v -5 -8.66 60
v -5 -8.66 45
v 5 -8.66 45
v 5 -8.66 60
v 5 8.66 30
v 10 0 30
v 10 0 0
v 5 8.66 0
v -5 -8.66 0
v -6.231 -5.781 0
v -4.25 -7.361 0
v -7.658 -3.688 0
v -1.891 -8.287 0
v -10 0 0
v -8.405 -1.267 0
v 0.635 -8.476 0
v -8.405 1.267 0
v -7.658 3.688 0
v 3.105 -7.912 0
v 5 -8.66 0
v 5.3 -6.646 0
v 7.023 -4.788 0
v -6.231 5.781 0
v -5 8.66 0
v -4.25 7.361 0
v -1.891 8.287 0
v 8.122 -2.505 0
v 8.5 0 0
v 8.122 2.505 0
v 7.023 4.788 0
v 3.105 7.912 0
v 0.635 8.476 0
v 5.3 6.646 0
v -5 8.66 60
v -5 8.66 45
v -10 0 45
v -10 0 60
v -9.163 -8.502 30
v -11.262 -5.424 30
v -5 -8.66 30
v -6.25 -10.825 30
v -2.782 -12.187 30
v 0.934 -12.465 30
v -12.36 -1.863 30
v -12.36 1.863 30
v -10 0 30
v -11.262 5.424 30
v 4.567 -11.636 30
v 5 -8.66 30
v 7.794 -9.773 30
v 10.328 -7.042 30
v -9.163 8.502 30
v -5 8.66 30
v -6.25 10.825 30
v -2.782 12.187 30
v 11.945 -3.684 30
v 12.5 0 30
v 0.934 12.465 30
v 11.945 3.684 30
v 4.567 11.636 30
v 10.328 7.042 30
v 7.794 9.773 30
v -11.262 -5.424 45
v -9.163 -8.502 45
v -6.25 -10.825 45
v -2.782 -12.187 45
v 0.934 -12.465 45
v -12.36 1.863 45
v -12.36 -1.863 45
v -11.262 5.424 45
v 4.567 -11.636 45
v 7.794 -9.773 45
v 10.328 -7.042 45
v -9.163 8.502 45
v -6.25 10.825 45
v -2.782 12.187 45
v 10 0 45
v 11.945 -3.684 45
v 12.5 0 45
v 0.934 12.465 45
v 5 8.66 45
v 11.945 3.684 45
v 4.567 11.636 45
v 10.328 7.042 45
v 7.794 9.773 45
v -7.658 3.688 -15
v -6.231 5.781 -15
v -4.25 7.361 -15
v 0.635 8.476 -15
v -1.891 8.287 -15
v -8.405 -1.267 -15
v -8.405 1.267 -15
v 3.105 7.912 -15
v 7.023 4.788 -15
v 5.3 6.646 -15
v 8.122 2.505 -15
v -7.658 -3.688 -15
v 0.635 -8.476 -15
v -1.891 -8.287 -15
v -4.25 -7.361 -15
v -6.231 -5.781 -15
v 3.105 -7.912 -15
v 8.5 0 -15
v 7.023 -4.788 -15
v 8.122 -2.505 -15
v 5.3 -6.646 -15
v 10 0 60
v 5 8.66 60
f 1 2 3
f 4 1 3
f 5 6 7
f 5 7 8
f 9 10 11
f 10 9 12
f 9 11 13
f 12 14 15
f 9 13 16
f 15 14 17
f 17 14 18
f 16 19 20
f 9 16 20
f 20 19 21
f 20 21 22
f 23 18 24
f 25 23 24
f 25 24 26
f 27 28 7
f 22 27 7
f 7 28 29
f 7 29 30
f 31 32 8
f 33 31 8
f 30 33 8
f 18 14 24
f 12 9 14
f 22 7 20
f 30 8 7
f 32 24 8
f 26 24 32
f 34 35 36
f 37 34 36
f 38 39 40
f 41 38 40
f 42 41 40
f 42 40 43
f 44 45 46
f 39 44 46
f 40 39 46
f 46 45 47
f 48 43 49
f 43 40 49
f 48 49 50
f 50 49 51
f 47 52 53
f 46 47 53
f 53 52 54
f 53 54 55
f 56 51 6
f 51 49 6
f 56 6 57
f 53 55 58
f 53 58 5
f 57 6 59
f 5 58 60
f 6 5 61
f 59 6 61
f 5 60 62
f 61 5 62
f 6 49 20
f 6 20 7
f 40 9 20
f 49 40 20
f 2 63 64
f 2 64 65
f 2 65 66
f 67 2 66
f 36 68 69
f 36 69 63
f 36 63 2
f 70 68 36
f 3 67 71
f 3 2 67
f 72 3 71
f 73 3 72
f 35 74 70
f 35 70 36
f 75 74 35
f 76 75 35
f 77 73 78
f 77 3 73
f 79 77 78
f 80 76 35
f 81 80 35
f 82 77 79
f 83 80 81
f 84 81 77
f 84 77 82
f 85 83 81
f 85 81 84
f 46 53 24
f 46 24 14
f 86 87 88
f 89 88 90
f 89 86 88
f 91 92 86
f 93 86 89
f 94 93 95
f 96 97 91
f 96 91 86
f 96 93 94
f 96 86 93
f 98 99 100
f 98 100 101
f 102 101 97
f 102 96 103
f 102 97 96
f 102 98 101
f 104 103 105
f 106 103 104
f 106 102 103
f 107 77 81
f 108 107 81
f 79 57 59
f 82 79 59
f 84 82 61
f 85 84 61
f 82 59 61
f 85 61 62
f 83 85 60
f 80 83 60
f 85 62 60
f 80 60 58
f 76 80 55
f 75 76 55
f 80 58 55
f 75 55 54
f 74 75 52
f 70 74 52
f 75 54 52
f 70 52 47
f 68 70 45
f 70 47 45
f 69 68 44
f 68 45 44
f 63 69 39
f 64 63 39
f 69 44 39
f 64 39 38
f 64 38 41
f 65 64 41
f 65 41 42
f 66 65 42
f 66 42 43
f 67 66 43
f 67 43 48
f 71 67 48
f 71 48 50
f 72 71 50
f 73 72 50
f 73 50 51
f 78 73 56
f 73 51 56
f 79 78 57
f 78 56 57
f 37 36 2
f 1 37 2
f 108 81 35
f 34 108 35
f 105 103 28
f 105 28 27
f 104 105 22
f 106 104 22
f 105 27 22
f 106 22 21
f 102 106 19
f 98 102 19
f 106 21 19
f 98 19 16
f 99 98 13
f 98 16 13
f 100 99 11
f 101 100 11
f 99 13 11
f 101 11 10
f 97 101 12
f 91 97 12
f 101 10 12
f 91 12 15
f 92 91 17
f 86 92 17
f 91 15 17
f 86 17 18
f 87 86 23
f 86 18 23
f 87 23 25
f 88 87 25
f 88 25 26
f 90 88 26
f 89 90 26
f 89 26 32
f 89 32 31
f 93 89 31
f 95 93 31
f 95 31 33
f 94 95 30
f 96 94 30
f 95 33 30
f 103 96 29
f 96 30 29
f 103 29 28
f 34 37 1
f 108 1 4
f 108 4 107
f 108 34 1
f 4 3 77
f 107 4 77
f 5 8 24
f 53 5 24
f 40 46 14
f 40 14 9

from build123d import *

# Parameters (mm, degrees)
F1_DEPTH = 30
F2_R     = 12.5
F3_DEPTH = 15
F4_DEPTH = 30
F5_R     = 8.5
F6_DEPTH = 15


with BuildPart() as f1:
    # F0 (on Top) → F1 (new body)
    with BuildSketch(Plane.XY):
        Polygon((-5, 8.6602540378), (-10, 0), (-5, -8.6602540378), (5, -8.6602540378), (10, 0), (5, 8.6602540378), align=None)
    extrude(amount=F1_DEPTH)

    # F2 (on face) → F3 (join)
    with BuildSketch(Plane.XY.offset(30)):
        Circle(F2_R)
        Polygon((-10, 0), (-5, 8.6602540378), (5, 8.6602540378), (10, 0), (5, -8.6602540378), (-5, -8.6602540378), align=None, mode=Mode.SUBTRACT)
    extrude(amount=F3_DEPTH)

    # F4 (add): a face of the model
    f4_faces = [f1.faces().sort_by_distance(p)[0] for p in [
        (0, 0, 30),
    ]]
    extrude(f4_faces, amount=F4_DEPTH)

    # F5 (on face) → F6 (join)
    with BuildSketch(Plane(origin=(0, 0, 0), x_dir=(1, 0, 0), z_dir=(0, 0, -1))):
        Circle(F5_R)
    extrude(amount=F6_DEPTH)


solid = f1.part
